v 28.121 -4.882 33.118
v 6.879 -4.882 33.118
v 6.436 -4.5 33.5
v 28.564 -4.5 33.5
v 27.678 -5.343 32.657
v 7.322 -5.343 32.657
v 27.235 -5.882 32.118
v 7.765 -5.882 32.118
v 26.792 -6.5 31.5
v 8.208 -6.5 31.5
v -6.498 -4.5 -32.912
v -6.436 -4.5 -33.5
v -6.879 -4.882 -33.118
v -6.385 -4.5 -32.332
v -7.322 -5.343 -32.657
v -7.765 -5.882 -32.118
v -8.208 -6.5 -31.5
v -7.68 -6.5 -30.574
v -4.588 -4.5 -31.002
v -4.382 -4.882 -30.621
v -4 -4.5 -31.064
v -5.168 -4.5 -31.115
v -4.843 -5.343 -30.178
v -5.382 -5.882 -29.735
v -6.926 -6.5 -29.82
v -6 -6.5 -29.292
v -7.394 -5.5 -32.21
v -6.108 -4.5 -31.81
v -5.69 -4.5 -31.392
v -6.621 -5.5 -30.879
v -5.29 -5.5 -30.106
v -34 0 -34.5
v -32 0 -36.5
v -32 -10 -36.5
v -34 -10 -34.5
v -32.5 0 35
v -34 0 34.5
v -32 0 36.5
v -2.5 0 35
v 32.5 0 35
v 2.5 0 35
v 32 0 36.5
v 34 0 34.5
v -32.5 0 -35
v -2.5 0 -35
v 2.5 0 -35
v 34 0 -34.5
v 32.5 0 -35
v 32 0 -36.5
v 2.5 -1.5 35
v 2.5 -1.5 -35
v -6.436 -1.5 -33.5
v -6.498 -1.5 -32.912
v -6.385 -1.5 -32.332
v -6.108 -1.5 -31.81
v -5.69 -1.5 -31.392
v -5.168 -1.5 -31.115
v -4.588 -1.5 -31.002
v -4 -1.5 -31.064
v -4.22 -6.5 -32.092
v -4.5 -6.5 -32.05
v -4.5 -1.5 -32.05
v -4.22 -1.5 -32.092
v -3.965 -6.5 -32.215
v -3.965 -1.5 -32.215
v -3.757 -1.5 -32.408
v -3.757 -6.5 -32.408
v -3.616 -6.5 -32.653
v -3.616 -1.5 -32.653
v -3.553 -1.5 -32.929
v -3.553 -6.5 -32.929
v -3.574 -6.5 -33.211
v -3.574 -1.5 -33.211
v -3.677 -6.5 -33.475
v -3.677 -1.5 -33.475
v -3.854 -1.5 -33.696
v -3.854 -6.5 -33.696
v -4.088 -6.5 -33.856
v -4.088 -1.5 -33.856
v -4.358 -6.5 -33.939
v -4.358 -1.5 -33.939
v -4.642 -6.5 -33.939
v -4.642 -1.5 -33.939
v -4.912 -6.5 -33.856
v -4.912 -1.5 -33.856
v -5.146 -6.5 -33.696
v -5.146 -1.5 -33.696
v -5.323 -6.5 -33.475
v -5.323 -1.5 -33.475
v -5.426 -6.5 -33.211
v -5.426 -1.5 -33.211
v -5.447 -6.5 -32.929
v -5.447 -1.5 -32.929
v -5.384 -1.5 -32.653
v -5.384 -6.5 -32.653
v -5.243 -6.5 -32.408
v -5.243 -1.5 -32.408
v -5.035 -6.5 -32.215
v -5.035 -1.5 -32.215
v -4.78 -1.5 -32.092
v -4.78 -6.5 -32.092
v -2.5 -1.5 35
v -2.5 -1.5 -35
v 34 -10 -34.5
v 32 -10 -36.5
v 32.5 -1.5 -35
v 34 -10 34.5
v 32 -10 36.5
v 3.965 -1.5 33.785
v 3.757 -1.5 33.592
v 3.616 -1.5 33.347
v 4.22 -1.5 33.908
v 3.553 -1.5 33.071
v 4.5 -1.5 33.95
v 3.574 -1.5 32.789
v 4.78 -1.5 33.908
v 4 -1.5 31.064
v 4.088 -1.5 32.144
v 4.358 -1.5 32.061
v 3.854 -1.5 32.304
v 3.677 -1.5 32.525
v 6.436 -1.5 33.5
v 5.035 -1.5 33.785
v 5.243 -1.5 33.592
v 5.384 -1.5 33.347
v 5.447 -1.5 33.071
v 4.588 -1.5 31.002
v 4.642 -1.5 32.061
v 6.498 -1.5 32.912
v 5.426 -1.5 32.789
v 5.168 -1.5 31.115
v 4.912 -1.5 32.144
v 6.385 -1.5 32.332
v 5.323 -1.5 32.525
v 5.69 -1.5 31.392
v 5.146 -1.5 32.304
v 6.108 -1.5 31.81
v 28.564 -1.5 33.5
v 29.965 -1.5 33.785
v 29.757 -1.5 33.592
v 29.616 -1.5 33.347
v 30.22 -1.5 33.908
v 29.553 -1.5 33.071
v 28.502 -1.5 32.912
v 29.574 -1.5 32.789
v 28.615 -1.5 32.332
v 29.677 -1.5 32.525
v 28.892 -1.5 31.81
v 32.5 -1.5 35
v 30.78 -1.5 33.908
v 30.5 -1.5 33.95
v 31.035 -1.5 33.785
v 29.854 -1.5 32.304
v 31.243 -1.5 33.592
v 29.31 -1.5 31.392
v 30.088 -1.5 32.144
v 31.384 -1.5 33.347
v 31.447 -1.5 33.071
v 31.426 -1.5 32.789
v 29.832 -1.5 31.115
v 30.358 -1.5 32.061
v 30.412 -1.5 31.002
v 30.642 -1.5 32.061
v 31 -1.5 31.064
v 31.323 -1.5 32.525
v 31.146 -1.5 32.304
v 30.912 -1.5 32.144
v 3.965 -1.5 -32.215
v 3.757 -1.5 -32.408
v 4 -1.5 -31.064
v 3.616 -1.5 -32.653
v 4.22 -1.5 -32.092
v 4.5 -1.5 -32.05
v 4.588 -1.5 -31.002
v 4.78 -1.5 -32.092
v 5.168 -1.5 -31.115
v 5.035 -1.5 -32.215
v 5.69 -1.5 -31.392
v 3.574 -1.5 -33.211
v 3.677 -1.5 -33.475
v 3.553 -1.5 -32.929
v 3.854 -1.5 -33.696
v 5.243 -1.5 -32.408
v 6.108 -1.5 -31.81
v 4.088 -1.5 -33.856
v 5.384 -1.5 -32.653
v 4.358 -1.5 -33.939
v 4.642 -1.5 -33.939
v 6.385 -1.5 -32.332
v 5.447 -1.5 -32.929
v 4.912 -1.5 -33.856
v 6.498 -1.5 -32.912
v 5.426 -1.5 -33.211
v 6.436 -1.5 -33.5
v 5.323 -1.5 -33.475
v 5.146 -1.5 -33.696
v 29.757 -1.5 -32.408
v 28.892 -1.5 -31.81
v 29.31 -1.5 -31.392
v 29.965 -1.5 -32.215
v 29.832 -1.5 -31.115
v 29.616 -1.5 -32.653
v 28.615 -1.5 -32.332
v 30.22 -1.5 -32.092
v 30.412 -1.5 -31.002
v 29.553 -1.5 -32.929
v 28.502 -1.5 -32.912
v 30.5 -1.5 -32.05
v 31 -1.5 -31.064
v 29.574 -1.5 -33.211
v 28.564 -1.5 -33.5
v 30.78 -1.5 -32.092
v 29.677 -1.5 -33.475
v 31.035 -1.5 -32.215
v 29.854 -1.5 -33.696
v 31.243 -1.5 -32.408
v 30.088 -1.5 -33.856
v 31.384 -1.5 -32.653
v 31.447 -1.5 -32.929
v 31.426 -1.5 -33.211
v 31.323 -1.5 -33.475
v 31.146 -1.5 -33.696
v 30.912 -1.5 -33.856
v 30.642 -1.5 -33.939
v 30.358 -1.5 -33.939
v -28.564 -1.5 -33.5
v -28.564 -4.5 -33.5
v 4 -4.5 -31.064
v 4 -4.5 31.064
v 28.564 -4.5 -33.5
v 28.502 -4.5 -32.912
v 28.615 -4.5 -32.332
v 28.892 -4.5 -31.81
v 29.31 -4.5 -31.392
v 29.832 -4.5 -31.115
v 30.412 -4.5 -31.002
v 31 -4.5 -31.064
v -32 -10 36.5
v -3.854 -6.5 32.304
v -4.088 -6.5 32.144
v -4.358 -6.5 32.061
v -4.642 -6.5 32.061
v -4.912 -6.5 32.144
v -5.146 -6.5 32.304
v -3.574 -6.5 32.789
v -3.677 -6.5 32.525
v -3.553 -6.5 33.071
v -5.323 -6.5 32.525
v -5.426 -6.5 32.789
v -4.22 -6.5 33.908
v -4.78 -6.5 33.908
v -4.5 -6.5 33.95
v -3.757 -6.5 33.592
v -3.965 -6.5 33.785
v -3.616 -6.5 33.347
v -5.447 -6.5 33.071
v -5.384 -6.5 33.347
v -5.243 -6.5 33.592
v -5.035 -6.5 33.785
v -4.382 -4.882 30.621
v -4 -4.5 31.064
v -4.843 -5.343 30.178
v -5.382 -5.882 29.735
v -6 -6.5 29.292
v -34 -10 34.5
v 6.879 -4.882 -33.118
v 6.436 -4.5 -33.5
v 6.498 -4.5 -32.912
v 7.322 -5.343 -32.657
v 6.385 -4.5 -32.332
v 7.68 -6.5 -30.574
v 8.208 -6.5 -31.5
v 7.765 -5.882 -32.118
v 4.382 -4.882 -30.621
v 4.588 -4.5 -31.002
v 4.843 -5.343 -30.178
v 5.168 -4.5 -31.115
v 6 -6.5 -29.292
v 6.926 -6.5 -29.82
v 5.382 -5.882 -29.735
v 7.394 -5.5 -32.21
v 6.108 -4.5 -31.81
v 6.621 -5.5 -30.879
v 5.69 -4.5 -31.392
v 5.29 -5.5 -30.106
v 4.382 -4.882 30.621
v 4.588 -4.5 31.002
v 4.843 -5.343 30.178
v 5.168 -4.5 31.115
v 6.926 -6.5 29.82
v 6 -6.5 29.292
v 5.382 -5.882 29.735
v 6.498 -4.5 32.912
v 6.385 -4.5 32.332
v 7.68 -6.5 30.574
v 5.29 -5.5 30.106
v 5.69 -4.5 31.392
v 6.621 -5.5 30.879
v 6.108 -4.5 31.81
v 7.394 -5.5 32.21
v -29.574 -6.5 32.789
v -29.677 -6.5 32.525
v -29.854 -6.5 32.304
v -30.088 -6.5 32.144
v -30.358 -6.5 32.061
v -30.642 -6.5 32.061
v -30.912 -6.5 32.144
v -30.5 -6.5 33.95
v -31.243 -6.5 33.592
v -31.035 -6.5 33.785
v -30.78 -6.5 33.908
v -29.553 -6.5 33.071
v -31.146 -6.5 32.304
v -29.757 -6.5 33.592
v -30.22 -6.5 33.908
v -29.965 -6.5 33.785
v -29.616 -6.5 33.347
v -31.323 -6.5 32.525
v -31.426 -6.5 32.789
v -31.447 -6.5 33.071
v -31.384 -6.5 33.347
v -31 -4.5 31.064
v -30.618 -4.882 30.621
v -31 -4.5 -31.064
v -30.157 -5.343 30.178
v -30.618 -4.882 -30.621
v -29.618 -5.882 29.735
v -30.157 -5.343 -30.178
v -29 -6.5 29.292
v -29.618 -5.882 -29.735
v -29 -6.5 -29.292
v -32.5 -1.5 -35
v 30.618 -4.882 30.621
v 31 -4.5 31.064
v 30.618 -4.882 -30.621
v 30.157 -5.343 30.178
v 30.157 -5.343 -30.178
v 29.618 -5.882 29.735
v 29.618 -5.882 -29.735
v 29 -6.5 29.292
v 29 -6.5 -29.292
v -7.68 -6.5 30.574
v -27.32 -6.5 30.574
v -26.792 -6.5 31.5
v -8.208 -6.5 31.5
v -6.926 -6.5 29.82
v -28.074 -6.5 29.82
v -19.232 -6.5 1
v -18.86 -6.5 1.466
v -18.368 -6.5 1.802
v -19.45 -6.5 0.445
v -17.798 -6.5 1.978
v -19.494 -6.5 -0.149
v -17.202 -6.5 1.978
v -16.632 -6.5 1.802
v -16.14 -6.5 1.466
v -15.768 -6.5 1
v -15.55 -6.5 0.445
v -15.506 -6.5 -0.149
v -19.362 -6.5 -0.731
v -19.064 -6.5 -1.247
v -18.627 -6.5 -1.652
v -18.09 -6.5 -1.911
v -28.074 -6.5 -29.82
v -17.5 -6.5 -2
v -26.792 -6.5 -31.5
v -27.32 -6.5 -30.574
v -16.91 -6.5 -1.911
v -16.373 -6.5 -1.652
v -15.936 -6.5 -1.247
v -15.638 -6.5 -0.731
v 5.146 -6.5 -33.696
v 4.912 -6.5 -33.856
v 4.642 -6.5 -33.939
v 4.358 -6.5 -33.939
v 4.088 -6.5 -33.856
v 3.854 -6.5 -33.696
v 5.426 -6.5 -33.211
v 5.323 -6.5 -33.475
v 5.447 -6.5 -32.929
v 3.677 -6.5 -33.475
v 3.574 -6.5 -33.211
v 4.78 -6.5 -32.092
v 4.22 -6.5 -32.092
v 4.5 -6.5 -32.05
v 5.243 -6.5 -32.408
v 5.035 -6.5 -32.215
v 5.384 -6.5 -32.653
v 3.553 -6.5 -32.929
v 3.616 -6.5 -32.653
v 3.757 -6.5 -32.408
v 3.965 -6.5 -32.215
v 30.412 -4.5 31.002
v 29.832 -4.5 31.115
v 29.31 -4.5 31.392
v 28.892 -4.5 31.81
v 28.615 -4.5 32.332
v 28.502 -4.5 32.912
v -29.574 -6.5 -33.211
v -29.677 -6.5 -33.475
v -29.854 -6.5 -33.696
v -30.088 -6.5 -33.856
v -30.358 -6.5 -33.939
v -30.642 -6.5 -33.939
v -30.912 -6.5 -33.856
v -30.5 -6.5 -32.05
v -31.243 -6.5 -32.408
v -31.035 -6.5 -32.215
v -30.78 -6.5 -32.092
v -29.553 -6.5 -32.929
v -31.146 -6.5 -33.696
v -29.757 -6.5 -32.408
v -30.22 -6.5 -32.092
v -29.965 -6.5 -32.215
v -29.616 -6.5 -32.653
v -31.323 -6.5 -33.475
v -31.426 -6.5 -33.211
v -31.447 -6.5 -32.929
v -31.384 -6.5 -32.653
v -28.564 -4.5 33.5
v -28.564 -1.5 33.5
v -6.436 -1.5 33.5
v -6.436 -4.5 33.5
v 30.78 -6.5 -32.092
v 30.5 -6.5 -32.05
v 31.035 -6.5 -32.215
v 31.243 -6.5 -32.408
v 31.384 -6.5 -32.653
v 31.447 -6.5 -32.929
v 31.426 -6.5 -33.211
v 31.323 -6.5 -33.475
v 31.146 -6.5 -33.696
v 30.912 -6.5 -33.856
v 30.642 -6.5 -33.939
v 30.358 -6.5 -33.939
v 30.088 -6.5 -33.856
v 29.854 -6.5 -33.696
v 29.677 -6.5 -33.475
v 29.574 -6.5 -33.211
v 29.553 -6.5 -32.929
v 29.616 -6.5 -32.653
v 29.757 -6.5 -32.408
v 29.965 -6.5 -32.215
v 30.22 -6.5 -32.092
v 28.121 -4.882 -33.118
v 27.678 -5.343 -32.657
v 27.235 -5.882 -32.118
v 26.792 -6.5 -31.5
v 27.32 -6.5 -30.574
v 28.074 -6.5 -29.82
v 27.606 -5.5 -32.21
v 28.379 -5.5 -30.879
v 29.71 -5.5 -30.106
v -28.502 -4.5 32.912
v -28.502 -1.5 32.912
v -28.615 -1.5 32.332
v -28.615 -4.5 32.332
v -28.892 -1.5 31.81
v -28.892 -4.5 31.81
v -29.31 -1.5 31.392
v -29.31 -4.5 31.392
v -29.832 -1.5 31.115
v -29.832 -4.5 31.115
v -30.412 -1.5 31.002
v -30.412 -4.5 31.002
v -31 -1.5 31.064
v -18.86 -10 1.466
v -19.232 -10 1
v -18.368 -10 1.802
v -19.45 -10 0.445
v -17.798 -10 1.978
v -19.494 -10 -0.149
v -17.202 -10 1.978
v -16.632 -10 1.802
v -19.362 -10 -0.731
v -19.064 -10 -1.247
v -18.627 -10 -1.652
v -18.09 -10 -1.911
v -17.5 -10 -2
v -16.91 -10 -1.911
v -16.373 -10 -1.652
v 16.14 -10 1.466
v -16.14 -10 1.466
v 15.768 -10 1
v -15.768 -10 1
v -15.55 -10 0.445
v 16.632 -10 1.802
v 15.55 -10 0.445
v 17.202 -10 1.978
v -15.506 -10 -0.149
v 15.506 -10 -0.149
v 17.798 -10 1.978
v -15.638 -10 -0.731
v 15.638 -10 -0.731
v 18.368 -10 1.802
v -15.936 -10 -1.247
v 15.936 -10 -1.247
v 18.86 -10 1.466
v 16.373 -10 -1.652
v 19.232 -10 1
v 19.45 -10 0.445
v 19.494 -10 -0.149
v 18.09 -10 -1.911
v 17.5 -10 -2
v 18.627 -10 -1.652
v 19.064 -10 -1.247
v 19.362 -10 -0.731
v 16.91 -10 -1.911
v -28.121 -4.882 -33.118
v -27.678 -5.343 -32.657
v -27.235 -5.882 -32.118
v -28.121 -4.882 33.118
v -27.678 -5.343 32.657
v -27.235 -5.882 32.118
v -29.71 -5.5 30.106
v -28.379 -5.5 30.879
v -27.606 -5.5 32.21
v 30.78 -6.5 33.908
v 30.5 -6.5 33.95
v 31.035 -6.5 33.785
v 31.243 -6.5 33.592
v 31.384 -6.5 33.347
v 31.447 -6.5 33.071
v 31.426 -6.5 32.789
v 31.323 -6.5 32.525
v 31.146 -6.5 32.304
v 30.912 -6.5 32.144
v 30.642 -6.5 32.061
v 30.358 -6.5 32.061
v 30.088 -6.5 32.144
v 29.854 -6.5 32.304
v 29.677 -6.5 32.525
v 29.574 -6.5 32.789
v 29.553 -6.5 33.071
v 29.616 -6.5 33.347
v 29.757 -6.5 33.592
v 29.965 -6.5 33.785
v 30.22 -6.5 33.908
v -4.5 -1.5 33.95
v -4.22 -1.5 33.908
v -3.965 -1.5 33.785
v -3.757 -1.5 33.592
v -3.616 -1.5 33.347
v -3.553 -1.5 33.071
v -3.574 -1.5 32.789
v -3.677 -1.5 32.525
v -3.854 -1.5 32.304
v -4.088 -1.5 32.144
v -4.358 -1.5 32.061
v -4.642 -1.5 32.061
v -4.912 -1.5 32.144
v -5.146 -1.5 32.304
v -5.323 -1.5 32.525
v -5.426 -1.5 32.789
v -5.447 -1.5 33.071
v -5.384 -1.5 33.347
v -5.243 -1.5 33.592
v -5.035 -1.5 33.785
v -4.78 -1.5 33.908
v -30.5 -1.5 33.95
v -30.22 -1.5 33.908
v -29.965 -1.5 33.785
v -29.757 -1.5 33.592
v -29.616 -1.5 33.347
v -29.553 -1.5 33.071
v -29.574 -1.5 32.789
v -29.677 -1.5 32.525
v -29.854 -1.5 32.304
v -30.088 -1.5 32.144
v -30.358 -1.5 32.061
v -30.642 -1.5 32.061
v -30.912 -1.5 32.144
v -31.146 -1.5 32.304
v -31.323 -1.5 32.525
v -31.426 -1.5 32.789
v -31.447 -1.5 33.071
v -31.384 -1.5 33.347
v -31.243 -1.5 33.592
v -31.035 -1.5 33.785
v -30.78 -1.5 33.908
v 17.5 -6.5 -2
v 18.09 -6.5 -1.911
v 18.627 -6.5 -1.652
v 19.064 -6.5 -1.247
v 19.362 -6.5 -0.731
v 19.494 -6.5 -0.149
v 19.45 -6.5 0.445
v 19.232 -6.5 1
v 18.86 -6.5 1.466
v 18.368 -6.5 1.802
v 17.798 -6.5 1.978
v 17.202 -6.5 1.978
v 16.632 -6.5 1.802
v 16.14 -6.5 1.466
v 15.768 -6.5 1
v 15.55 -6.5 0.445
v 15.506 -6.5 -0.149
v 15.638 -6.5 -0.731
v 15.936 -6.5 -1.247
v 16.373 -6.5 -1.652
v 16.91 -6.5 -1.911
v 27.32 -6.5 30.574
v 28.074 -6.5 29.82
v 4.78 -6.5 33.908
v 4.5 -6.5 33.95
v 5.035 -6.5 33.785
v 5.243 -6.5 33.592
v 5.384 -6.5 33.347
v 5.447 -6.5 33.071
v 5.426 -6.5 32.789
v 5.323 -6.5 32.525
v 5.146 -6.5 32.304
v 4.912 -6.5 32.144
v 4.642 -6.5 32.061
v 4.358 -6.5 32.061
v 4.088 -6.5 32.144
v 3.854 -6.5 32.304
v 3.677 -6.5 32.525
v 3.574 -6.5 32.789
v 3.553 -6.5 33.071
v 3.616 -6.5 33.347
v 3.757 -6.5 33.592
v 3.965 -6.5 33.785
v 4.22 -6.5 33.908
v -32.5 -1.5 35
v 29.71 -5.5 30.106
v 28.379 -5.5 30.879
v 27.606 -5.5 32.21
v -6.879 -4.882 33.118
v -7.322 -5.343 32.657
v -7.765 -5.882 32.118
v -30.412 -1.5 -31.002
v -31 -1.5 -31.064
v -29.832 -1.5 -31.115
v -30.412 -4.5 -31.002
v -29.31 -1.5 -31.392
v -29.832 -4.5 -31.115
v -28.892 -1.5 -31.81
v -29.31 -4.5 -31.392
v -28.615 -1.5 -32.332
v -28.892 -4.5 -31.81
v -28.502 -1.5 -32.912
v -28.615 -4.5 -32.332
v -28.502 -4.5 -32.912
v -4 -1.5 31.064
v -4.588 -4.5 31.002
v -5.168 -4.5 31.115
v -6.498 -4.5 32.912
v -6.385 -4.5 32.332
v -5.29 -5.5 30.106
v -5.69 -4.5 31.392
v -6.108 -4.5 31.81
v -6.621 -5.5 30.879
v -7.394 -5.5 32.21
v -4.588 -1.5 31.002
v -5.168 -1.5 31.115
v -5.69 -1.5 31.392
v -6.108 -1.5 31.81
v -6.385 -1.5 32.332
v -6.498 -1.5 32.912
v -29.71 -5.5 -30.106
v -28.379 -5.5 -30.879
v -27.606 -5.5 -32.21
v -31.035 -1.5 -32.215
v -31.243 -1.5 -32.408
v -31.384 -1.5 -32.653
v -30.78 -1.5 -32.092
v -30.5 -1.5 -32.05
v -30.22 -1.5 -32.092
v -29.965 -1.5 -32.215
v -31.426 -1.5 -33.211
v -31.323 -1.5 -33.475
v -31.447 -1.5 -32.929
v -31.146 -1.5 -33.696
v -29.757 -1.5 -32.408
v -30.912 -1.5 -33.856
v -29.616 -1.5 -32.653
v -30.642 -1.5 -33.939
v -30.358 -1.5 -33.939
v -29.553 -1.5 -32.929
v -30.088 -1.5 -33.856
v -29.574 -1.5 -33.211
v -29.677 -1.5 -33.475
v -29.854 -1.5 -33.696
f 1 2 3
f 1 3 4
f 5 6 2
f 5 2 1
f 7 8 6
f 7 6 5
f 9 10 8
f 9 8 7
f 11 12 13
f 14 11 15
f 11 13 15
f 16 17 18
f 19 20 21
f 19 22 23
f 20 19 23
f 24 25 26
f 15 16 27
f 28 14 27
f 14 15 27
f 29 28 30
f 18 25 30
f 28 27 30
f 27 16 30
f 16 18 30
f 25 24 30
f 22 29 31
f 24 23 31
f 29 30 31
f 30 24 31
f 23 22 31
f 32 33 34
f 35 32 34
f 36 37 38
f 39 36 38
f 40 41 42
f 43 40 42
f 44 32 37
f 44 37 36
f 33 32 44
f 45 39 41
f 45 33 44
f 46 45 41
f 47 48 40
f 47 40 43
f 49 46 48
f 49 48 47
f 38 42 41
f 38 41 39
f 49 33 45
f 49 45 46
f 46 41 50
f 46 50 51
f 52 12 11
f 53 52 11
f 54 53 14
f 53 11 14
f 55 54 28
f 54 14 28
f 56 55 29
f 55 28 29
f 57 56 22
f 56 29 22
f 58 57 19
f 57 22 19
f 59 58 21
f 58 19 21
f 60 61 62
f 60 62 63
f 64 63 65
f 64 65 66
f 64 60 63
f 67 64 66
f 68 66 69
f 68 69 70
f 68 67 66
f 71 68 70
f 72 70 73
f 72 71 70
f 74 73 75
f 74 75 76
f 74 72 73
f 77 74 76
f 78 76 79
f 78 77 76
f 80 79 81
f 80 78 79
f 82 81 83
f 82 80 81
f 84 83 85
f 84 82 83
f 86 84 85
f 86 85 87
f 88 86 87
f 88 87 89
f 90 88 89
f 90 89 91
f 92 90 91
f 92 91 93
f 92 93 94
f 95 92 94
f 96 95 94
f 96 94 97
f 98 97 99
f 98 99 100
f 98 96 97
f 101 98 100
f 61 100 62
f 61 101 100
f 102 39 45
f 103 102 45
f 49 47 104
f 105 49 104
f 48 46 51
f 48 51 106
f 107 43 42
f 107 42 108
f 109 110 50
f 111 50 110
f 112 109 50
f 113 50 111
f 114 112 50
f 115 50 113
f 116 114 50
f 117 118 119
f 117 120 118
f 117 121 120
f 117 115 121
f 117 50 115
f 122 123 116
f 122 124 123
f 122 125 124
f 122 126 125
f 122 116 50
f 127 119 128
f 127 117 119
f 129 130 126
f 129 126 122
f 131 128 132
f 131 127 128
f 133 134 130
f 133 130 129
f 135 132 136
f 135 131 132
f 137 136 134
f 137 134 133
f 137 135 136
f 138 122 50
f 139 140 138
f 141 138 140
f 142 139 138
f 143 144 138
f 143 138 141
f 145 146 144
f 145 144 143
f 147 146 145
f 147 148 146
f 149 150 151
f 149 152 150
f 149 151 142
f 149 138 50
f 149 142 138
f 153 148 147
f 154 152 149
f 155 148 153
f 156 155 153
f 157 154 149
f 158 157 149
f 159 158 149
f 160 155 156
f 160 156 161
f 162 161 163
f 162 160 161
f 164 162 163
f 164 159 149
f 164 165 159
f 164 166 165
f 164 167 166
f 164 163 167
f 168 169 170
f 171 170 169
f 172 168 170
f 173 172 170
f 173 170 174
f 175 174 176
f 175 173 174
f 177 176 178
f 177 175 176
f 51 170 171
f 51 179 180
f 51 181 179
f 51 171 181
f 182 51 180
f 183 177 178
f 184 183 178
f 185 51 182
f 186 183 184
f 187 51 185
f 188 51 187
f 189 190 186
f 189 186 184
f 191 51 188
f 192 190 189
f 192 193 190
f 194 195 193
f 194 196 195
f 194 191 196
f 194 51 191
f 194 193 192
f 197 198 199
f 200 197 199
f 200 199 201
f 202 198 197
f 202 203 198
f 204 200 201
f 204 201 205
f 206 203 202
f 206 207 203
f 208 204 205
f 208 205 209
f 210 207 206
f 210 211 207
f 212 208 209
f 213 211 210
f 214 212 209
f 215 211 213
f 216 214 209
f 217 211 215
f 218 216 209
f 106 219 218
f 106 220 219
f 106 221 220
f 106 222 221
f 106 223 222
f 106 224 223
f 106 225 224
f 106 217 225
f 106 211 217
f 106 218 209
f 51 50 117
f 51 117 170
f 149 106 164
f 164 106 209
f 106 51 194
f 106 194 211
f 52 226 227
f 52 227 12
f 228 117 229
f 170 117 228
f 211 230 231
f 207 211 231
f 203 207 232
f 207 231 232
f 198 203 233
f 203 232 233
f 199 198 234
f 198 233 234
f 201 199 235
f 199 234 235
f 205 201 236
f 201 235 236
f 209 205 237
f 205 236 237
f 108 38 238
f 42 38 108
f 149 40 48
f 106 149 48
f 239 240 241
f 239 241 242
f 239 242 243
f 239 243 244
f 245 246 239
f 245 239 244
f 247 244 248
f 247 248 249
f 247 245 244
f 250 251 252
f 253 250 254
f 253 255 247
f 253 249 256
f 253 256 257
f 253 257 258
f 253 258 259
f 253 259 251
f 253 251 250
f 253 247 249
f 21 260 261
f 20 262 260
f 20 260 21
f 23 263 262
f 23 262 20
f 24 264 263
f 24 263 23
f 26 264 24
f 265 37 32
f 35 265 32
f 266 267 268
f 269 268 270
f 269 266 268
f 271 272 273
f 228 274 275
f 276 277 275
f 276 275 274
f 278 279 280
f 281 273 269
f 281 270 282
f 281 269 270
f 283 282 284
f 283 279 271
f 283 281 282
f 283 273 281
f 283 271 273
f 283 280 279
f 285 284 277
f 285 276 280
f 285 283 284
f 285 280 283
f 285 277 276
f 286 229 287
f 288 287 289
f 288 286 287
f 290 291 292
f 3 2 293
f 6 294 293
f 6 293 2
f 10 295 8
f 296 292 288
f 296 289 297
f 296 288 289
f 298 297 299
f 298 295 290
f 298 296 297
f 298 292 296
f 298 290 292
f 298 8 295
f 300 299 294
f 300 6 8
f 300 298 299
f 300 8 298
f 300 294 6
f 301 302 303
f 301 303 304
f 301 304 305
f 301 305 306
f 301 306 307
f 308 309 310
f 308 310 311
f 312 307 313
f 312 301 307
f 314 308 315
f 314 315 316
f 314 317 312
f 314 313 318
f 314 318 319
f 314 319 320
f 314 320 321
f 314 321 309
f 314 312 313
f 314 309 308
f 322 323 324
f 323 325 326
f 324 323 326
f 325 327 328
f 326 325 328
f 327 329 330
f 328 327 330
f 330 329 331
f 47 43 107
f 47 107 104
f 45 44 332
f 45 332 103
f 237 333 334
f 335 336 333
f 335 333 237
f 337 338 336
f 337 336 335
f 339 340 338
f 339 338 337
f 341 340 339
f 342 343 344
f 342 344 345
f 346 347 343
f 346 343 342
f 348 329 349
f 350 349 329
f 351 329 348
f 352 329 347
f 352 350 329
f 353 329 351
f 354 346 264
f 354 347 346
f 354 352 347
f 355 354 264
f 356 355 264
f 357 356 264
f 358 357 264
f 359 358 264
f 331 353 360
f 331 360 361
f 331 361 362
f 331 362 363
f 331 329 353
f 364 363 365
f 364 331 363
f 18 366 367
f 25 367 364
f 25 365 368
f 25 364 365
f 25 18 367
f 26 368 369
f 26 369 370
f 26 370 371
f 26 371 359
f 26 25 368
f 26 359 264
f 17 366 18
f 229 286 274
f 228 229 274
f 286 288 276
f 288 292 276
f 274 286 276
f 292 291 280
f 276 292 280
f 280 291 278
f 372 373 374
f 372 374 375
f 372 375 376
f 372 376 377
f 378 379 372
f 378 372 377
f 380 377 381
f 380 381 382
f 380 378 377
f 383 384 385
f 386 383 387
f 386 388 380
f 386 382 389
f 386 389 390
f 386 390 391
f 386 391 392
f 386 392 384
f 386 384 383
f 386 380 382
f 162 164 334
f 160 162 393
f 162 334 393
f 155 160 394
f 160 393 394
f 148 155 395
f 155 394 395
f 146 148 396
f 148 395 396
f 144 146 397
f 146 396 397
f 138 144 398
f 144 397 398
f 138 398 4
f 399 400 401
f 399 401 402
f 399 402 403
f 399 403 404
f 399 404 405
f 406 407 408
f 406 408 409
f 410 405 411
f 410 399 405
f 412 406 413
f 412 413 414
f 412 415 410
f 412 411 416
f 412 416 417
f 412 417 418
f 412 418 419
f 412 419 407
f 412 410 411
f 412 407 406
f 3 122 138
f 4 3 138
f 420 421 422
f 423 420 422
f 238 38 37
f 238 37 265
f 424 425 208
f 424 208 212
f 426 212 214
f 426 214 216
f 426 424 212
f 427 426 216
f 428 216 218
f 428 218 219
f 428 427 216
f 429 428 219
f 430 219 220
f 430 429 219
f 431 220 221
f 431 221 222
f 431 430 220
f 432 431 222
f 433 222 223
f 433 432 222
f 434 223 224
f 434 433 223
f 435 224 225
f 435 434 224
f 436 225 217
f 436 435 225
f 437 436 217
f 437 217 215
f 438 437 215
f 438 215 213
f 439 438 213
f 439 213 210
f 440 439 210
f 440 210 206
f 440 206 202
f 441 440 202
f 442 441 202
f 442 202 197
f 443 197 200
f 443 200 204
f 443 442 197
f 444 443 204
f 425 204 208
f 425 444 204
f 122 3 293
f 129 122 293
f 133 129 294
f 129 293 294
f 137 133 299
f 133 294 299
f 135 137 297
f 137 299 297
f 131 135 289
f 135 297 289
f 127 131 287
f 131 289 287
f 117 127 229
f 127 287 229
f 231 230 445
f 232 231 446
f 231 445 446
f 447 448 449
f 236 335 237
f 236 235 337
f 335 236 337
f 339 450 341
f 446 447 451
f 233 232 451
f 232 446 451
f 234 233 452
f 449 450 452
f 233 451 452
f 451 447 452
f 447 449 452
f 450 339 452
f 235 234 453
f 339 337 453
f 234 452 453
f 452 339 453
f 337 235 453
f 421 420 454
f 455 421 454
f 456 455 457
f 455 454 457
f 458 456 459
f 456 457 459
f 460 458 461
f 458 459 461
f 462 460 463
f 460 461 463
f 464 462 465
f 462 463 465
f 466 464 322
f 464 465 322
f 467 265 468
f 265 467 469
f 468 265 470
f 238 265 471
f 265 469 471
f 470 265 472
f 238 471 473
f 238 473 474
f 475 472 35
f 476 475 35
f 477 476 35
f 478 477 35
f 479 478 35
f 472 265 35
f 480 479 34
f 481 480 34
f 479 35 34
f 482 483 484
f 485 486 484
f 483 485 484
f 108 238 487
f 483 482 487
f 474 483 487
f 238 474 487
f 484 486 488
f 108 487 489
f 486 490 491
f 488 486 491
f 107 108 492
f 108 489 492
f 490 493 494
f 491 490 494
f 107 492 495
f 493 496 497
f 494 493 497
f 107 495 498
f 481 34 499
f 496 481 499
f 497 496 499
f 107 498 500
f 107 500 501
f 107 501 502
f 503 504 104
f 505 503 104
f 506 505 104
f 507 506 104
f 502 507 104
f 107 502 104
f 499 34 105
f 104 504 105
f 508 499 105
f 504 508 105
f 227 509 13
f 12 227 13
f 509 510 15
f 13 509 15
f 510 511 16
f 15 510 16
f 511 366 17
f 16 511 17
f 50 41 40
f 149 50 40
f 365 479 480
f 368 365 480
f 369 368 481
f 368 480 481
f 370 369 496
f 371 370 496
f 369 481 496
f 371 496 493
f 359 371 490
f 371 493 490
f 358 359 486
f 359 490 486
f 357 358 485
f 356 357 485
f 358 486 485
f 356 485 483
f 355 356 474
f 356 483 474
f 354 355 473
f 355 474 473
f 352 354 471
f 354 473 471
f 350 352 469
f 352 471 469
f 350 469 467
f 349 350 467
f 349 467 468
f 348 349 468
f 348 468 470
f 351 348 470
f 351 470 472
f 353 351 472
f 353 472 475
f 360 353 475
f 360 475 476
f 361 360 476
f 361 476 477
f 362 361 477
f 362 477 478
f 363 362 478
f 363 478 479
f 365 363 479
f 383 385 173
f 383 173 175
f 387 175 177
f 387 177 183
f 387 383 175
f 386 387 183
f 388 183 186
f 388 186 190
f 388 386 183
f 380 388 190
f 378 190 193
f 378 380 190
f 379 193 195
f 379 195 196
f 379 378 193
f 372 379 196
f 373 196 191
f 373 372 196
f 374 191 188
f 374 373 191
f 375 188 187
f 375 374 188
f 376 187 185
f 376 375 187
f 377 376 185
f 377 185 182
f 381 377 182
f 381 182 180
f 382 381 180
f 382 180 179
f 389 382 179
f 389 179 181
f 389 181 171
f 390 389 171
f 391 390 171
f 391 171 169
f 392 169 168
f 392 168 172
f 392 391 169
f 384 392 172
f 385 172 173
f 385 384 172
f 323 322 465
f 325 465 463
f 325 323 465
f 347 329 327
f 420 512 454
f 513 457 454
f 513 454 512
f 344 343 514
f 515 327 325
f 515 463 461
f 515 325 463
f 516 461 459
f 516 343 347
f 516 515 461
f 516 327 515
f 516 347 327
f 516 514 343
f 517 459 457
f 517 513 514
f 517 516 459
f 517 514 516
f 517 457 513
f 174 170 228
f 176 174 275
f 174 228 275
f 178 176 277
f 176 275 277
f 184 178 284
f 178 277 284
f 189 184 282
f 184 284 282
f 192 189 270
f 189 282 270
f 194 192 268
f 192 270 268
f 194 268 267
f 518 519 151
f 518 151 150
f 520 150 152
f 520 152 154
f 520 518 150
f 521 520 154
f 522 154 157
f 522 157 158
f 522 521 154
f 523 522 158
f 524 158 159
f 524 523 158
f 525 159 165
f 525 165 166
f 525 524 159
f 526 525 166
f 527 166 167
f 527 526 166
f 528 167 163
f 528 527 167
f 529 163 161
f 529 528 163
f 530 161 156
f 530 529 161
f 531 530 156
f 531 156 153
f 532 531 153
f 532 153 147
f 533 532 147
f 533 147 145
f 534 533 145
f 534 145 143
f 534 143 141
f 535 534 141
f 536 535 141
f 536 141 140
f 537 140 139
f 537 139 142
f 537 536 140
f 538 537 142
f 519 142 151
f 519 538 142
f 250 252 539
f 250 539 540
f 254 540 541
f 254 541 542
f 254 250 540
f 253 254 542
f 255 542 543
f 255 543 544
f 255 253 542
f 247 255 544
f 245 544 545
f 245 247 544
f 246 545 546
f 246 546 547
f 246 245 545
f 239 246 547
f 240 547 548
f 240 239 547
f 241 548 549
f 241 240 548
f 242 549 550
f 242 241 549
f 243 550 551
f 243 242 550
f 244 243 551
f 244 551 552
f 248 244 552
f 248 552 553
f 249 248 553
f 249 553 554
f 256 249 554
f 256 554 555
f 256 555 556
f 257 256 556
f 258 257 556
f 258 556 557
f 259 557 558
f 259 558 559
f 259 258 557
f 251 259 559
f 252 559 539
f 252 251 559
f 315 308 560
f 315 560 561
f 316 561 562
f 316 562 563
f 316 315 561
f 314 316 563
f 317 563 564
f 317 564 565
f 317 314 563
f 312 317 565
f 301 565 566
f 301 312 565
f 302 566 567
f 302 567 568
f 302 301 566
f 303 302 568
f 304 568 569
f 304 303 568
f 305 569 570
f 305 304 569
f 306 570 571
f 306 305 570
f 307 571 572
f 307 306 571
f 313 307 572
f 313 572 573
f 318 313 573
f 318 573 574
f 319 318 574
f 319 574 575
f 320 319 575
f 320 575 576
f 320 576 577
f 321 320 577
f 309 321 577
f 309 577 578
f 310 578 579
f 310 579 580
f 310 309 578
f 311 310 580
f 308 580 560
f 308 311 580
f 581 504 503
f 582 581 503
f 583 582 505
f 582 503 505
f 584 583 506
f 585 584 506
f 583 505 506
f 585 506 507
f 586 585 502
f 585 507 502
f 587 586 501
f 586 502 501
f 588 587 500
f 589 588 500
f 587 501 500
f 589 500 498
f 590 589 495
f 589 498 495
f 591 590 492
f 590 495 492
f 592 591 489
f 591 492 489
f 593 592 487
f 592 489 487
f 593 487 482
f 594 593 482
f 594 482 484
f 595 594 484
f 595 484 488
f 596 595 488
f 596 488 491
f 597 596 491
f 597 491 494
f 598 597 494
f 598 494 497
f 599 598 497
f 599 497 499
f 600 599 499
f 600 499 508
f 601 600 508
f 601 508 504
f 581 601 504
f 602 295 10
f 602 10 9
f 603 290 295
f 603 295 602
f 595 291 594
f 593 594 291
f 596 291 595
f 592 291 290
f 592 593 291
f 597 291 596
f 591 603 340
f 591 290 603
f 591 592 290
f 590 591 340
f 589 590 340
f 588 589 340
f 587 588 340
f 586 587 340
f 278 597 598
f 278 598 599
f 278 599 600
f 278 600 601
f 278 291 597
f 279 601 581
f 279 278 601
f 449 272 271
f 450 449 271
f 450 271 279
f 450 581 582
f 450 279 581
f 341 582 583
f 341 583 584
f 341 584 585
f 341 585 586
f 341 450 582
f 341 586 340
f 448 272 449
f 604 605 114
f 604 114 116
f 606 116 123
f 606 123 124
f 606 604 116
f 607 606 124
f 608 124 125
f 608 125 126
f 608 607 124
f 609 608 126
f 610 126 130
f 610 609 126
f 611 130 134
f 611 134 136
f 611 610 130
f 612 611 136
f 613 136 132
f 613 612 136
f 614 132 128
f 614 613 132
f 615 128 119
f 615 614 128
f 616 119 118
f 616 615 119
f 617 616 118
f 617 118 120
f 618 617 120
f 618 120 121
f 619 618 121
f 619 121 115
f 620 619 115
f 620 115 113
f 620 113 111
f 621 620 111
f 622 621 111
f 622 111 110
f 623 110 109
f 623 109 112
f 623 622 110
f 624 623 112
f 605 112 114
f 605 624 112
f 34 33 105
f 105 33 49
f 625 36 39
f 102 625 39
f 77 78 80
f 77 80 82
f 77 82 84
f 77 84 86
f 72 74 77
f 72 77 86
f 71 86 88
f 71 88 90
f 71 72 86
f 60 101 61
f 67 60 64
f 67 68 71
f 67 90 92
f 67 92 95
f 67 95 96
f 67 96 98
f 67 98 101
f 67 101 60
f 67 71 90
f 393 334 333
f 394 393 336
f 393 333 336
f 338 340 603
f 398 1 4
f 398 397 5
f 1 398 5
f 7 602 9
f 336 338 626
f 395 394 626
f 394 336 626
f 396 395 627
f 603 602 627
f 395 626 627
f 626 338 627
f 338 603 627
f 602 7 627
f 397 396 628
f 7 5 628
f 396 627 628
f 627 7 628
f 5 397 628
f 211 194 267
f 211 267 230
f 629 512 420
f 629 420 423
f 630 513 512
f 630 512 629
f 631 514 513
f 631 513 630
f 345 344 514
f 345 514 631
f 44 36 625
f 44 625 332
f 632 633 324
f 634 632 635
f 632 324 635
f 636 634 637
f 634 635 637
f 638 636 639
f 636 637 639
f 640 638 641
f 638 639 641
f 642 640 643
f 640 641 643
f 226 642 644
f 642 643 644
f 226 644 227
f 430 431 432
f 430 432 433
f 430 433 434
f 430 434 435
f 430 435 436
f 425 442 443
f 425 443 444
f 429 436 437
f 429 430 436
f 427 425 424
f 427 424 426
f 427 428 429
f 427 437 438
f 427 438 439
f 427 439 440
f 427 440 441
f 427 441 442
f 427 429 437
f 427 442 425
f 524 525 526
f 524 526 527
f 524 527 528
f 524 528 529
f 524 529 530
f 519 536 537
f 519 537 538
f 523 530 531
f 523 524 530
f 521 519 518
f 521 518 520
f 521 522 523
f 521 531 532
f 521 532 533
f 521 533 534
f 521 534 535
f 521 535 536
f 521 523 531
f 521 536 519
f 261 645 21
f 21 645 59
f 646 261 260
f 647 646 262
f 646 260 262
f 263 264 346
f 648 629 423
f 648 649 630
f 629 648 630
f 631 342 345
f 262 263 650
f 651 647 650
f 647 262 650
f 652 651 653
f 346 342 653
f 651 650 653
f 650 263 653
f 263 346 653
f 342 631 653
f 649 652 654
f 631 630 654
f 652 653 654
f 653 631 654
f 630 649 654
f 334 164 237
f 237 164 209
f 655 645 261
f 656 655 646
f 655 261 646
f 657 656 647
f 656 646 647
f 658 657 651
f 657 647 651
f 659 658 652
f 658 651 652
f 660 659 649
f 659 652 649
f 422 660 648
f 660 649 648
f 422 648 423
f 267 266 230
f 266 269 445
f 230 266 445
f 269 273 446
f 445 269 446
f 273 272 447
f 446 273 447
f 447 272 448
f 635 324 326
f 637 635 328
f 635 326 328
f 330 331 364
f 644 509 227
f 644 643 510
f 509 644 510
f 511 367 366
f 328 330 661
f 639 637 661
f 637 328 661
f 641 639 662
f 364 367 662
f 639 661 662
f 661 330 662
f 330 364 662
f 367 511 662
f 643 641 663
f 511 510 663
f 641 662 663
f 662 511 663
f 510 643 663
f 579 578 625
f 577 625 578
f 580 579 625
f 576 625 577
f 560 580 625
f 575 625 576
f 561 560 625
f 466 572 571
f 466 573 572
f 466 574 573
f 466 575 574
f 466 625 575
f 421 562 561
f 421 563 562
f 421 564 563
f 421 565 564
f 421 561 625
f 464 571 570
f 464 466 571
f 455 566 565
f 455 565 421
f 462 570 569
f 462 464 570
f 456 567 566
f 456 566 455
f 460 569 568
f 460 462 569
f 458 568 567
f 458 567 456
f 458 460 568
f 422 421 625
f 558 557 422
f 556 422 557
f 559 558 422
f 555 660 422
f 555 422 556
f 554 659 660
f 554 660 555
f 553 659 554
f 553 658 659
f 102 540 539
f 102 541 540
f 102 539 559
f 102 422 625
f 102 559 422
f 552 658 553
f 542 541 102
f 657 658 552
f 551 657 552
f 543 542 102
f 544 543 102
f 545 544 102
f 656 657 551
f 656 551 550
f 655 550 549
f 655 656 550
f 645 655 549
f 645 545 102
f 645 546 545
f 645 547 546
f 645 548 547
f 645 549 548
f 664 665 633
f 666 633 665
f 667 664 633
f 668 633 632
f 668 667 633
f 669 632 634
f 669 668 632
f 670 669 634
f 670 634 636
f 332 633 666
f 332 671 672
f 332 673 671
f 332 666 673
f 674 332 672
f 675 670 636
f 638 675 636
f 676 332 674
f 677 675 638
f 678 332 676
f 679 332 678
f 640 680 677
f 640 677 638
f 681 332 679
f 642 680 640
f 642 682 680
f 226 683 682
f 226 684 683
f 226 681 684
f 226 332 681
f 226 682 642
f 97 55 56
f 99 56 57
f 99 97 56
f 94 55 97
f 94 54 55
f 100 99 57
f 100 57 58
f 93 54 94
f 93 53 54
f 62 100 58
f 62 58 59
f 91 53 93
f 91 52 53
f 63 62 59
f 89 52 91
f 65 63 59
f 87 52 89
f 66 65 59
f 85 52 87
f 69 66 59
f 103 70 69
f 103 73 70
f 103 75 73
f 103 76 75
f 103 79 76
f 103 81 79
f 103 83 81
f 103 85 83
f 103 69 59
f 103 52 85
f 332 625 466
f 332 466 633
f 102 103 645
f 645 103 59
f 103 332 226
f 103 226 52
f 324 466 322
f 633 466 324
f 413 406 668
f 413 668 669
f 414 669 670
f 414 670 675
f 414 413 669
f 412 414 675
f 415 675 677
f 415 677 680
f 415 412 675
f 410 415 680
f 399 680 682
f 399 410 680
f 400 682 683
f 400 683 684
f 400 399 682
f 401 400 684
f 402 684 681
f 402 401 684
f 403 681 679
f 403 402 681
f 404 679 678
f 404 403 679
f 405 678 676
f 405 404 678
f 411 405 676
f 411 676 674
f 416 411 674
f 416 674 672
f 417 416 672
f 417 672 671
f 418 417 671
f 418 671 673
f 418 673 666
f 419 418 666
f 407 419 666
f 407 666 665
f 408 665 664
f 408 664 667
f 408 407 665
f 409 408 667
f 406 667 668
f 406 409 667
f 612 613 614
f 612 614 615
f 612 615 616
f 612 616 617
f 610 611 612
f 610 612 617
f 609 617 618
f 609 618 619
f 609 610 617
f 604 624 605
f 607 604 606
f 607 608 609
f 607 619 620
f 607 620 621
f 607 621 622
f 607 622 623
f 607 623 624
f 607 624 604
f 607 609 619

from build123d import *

# Parameters (mm, degrees)
SKETCH2_W           = 68
SKETCH2_H           = 73
SKETCH2_W_2         = 30
SKETCH2_H_2         = 70
BOSS_EXTRUDE1_DEPTH = 10
SKETCH2_3_W         = 30
SKETCH2_3_H         = 70
CUT_EXTRUDE2_DEPTH  = 1.5
SKETCH3_W           = 27
SKETCH3_H           = 67
CUT_EXTRUDE3_DEPTH  = 5
SKETCH4_R           = 2
BOSS_EXTRUDE2_DEPTH = 5
CUT_EXTRUDE4_START  = -5
SKETCH5_R           = 0.95
CUT_EXTRUDE4_DEPTH  = 5
CHAMFER1_SIZE       = 2
CHAMFER2_SIZE       = 2
SKETCH6_R           = 2
CUT_EXTRUDE5_DEPTH  = 4


with BuildPart() as part:
    # Sketch2 → Boss-Extrude1 (new body)
    # profile 1 of 3: a face of its own
    with BuildSketch(Plane(origin=(0, 0, 0), x_dir=(1, 0, 0), z_dir=(0, 1, 0))):
        Rectangle(SKETCH2_W, SKETCH2_H)
        with Locations((17.5, 0)):
            Rectangle(SKETCH2_W_2, SKETCH2_H_2, mode=Mode.SUBTRACT)
        with Locations((-17.5, 0)):
            Rectangle(SKETCH2_W_2, SKETCH2_H_2, mode=Mode.SUBTRACT)
    # profile 2 of 3: a face of its own
    with BuildSketch(Plane(origin=(0, 0, 0), x_dir=(1, 0, 0), z_dir=(0, 1, 0))):
        with Locations((17.5, 0)):
            Rectangle(SKETCH2_W_2, SKETCH2_H_2)
    # profile 3 of 3: a face of its own
    with BuildSketch(Plane(origin=(0, 0, 0), x_dir=(1, 0, 0), z_dir=(0, 1, 0))):
        with Locations((-17.5, 0)):
            Rectangle(SKETCH2_W_2, SKETCH2_H_2)
    extrude(amount=-BOSS_EXTRUDE1_DEPTH)

    # Sketch2<3> → Cut-Extrude2 (cut)
    with BuildSketch(Plane(origin=(0, 0, 0), x_dir=(1, 0, 0), z_dir=(0, 1, 0))):
        with Locations((-17.5, 0)):
            Rectangle(SKETCH2_3_W, SKETCH2_3_H)
        with Locations((17.5, 0)):
            Rectangle(SKETCH2_3_W, SKETCH2_3_H)
    extrude(amount=-CUT_EXTRUDE2_DEPTH, mode=Mode.SUBTRACT)

    # Sketch3 → Cut-Extrude3 (cut)
    with BuildSketch(Plane(origin=(0, -1.5, 0), x_dir=(1, 0, 0), z_dir=(0, 1, 0))):
        with Locations((-17.5, 0)):
            Rectangle(SKETCH3_W, SKETCH3_H)
        with Locations((17.5, 0)):
            Rectangle(SKETCH3_W, SKETCH3_H)
    extrude(amount=-CUT_EXTRUDE3_DEPTH, mode=Mode.SUBTRACT)

    # Sketch4 → Boss-Extrude2 (add)
    with BuildSketch(Plane(origin=(0, -6.5, 0), x_dir=(1, 0, 0), z_dir=(0, 1, 0))):
        with Locations((-30.5, 33)):
            Circle(SKETCH4_R)
        with Locations((-4.5, 33)):
            Circle(SKETCH4_R)
        with Locations((-4.5, -33)):
            Circle(SKETCH4_R)
        with Locations((-30.5, -33)):
            Circle(SKETCH4_R)
        with Locations((30.5, -33)):
            Circle(SKETCH4_R)
        with Locations((4.5, -33)):
            Circle(SKETCH4_R)
        with Locations((4.5, 33)):
            Circle(SKETCH4_R)
        with Locations((30.5, 33)):
            Circle(SKETCH4_R)
    extrude(amount=BOSS_EXTRUDE2_DEPTH)

    # Sketch5 → Cut-Extrude4 (cut)
    with BuildSketch(Plane(origin=(0, -1.5, 0), x_dir=(1, 0, 0), z_dir=(0, 1, 0)).offset(CUT_EXTRUDE4_START)):
        with Locations(Location((-30.5, 33, 0), (0, 0, 270))):
            Circle(SKETCH5_R)
        with Locations(Location((-4.5, 33, 0), (0, 0, 270))):
            Circle(SKETCH5_R)
        with Locations(Location((-4.5, -33, 0), (0, 0, 270))):
            Circle(SKETCH5_R)
        with Locations(Location((-30.5, -33, 0), (0, 0, 270))):
            Circle(SKETCH5_R)
        with Locations(Location((30.5, -33, 0), (0, 0, 270))):
            Circle(SKETCH5_R)
        with Locations(Location((4.5, -33, 0), (0, 0, 270))):
            Circle(SKETCH5_R)
        with Locations(Location((4.5, 33, 0), (0, 0, 270))):
            Circle(SKETCH5_R)
        with Locations(Location((30.5, 33, 0), (0, 0, 270))):
            Circle(SKETCH5_R)
    extrude(amount=CUT_EXTRUDE4_DEPTH, mode=Mode.SUBTRACT)

    # Chamfer1
    chamfer1_edges = [part.edges().sort_by_distance(p)[0] for p in [
        (-34, -5, 36.5),
        (-34, -5, -36.5),
        (34, -5, -36.5),
        (34, -5, 36.5),
    ]]
    chamfer(chamfer1_edges, length=CHAMFER1_SIZE)

    # Chamfer2
    chamfer2_edges = [part.edges().sort_by_distance(p)[0] for p in [
        (-4, -6.5, 0),
        (-5.914213562, -6.5, 31.585786438),
        (-17.5, -6.5, 33.5),
        (-29.085786438, -6.5, 31.585786438),
        (31, -6.5, 0),
        (29.085786438, -6.5, 31.585786438),
        (17.5, -6.5, 33.5),
        (5.914213562, -6.5, 31.585786438),
        (4, -6.5, 0),
        (5.914213562, -6.5, -31.585786438),
        (17.5, -6.5, -33.5),
        (29.085786438, -6.5, -31.585786438),
        (-31, -6.5, 0),
        (-29.085786438, -6.5, -31.585786438),
        (-17.5, -6.5, -33.5),
        (-5.914213562, -6.5, -31.585786438),
    ]]
    chamfer(chamfer2_edges, length=CHAMFER2_SIZE)

    # Sketch6 → Cut-Extrude5 (cut)
    with BuildSketch(Plane.XZ.offset(10)):
        with Locations(Location((-17.5, 0, 0), (0, 0, 270))):
            Circle(SKETCH6_R)
        with Locations(Location((17.5, 0, 0), (0, 0, 270))):
            Circle(SKETCH6_R)
    extrude(amount=-CUT_EXTRUDE5_DEPTH, mode=Mode.SUBTRACT)


solid = part.part
